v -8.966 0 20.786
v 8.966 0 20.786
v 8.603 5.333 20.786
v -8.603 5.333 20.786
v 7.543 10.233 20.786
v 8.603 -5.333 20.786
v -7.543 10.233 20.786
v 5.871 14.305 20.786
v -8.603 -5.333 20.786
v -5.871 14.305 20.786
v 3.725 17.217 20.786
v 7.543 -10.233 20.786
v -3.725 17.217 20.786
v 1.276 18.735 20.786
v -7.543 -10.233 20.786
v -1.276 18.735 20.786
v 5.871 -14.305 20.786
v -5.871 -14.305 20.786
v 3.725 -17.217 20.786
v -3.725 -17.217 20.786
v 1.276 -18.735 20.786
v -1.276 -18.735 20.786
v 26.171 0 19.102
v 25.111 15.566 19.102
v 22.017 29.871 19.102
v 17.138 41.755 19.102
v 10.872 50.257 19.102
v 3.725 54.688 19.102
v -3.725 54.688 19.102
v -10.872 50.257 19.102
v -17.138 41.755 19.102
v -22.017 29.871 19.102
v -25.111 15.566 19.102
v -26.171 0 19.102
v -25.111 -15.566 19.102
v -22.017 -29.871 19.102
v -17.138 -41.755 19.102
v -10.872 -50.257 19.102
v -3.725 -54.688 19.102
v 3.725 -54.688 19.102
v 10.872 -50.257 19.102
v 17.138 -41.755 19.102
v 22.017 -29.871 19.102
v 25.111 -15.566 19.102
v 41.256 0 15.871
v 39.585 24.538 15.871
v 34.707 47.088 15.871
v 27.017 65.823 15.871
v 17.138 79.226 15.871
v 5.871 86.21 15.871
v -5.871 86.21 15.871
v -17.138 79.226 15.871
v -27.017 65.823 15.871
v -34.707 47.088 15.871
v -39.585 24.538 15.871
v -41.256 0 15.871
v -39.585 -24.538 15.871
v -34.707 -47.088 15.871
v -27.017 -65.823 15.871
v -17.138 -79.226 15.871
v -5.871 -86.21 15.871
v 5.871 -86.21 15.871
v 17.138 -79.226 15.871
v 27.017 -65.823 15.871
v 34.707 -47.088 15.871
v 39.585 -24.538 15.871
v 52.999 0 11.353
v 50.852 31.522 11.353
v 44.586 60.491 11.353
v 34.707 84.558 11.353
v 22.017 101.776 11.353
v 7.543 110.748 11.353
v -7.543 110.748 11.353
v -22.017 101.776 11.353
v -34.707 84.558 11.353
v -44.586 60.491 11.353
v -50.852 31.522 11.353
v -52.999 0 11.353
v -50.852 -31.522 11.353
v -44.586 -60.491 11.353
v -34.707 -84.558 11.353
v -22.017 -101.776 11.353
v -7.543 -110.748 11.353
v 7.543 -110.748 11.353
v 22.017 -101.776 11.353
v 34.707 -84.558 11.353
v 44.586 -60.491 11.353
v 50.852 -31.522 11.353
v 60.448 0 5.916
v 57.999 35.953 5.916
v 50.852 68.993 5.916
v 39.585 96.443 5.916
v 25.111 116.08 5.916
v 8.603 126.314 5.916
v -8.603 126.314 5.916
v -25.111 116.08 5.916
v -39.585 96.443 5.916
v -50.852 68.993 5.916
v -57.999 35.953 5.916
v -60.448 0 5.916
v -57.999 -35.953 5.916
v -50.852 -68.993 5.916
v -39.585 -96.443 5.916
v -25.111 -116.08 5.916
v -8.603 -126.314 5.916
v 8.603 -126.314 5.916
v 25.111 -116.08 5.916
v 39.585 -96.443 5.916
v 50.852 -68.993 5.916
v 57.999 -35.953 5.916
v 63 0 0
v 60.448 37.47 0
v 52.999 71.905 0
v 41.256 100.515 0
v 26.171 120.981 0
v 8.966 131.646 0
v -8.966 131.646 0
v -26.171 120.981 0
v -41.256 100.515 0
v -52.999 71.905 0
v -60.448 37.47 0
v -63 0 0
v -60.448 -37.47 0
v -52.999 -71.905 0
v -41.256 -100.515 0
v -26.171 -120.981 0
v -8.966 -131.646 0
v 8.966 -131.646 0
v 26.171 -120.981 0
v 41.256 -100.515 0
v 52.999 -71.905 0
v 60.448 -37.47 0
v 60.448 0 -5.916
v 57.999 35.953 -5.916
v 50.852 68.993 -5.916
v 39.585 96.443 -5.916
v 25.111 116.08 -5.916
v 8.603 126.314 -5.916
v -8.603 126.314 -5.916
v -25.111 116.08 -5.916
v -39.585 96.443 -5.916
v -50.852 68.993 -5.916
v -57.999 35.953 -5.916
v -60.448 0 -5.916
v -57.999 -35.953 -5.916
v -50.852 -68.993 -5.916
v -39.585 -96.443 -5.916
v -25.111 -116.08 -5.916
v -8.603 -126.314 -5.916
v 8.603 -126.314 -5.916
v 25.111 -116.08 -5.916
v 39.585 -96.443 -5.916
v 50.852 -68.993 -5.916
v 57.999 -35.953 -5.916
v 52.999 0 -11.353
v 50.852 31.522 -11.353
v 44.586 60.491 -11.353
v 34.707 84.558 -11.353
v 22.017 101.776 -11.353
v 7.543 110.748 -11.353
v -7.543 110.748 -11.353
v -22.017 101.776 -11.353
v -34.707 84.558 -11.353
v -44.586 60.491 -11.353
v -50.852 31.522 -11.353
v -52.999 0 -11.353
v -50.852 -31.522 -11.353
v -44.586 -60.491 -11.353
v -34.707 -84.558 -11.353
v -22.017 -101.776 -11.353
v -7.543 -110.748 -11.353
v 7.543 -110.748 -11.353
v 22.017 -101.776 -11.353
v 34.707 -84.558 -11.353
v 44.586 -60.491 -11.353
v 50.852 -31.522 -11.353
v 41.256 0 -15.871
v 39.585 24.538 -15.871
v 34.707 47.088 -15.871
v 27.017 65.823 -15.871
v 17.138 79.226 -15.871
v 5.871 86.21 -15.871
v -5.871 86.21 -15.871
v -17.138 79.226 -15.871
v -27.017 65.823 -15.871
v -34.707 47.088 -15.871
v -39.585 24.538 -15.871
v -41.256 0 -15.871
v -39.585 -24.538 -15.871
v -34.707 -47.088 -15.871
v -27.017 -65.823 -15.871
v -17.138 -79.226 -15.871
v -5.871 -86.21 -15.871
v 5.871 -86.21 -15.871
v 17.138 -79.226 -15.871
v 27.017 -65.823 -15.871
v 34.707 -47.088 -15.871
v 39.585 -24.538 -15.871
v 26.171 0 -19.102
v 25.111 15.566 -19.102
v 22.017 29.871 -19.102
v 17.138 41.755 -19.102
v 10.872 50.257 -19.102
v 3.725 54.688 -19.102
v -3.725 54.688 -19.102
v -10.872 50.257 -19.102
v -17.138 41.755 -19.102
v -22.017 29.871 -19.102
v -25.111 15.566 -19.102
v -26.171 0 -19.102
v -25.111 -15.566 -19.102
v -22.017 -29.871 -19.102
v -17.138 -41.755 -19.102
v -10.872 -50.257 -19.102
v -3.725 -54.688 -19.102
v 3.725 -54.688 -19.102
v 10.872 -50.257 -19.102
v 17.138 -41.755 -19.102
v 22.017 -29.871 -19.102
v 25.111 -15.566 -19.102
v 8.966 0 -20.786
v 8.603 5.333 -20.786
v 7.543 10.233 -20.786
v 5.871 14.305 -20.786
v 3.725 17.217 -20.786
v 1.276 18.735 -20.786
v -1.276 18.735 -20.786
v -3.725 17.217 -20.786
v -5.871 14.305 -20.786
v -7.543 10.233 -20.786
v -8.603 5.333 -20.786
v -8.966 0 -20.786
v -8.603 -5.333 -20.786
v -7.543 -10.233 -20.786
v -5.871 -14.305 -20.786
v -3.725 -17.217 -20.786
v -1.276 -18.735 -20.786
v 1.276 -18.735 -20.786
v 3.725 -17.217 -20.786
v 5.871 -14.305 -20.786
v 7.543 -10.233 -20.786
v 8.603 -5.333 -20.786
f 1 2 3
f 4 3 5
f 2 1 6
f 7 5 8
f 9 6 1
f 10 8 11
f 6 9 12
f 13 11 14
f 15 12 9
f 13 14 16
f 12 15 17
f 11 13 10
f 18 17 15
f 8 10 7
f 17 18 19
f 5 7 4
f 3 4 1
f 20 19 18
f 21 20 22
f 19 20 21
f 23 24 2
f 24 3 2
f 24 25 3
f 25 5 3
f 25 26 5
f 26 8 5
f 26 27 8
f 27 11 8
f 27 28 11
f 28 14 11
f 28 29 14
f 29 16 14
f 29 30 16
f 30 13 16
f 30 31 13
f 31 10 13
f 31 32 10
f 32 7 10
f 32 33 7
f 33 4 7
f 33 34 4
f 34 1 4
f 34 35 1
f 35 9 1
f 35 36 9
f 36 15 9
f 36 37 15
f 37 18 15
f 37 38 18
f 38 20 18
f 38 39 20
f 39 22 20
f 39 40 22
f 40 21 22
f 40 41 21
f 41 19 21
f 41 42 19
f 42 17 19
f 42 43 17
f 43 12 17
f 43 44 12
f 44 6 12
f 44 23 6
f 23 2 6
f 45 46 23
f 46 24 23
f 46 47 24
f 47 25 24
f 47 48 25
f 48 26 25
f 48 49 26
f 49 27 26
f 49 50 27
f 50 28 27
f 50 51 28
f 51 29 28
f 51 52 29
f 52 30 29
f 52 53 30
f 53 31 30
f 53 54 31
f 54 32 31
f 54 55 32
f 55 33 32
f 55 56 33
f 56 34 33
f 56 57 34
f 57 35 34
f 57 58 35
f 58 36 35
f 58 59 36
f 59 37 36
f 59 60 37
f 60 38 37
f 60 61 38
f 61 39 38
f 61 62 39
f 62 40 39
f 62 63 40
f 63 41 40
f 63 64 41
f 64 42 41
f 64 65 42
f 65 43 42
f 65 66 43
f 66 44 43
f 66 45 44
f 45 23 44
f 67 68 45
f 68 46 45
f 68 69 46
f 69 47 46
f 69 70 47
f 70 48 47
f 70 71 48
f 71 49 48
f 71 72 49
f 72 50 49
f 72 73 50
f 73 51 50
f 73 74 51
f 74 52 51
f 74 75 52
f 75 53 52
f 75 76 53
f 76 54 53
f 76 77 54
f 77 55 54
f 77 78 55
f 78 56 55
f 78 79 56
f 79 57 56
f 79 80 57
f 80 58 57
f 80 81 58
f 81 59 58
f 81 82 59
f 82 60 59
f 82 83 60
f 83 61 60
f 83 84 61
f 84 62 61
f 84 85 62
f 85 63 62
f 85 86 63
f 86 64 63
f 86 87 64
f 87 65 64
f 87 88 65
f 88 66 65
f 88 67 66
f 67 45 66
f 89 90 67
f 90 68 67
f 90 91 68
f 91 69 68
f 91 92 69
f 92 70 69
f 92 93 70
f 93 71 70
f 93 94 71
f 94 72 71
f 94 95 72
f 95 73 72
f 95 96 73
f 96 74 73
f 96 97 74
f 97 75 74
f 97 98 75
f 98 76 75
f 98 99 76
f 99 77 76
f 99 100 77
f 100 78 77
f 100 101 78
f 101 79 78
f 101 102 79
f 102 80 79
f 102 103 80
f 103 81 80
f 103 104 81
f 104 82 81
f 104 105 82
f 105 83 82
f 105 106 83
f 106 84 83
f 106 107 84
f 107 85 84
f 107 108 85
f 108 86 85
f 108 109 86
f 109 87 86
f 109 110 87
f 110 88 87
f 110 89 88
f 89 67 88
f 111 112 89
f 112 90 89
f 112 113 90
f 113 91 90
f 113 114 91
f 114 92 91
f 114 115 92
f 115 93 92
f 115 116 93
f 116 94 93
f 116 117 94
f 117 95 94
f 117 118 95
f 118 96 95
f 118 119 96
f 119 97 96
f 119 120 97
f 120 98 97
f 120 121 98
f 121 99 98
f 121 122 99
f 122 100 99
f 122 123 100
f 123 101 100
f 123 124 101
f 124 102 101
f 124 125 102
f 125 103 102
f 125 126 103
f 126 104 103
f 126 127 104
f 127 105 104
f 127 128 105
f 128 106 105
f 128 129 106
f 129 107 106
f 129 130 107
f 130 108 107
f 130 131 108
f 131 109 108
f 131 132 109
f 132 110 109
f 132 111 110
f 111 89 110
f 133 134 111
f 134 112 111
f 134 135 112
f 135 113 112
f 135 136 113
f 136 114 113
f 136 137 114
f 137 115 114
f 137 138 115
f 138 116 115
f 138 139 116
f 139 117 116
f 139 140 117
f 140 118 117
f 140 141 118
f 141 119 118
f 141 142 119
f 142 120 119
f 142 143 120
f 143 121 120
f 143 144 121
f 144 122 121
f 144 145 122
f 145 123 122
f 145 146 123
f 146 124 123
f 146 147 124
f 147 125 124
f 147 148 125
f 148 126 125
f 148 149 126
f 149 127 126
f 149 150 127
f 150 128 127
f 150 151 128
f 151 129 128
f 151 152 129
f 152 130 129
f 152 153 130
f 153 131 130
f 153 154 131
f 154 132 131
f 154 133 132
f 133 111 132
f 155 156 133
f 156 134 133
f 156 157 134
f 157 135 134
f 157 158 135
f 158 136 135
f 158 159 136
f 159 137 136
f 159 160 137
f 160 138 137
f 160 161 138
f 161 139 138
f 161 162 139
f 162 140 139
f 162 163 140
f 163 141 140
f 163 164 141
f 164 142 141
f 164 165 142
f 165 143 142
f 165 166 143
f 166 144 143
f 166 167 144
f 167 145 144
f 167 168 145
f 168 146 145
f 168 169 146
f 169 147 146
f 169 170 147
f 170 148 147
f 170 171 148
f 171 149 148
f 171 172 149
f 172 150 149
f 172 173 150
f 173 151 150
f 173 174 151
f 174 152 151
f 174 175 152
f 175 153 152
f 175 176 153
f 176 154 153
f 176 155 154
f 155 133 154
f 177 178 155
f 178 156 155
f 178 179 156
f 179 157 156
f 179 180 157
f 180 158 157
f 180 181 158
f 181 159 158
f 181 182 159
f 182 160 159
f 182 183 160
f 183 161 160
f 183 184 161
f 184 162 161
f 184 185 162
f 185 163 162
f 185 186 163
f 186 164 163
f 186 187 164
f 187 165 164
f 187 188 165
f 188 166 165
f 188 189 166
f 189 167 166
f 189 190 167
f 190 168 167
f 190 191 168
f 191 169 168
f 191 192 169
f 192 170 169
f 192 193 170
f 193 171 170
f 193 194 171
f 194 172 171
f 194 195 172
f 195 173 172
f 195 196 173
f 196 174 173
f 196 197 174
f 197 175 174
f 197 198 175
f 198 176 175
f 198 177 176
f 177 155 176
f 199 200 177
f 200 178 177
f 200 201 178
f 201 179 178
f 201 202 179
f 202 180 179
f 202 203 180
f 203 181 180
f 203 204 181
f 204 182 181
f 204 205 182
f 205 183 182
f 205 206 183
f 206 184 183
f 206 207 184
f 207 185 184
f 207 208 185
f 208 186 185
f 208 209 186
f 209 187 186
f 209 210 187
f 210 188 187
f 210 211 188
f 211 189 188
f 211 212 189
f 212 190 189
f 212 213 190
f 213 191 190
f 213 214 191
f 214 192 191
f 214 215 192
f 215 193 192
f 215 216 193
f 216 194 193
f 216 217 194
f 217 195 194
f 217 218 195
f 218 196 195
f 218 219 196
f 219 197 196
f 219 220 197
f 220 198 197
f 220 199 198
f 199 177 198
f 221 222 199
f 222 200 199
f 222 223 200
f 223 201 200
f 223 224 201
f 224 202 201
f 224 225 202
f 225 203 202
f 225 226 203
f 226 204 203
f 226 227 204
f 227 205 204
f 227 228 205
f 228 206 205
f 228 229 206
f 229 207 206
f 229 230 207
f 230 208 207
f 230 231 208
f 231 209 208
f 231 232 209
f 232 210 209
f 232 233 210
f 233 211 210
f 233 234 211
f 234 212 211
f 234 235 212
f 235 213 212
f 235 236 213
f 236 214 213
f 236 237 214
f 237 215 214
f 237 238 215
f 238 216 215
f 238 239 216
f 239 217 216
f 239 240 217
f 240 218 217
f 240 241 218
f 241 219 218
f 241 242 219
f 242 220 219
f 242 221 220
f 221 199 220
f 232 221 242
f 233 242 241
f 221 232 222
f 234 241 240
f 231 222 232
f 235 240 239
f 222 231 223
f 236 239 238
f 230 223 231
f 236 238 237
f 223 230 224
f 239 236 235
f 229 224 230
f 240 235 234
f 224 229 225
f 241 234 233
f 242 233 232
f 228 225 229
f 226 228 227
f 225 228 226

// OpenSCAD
// Generated by SolidPython 1.0.1 on 2020-07-29 00:46:49


scale(v = [9, 19, 3]) {
	sphere(r = 7);
}
/***********************************************
*********      SolidPython code:      **********
************************************************
 
# import packages: SolidPython
from solid import *
from solid.utils import *
from itertools import chain, combinations, permutations


class Resize:

    def __init__(self, scad_file):
        self.scad_file = scad_file
        #self.scad_file = import_scad(scad_file)
        # cone/cylinder param:
        self.r1 = 0
        self.r2 = 0
        self.h = 0
        # rectangular prism param:
        self.w = 0
        self.l = 0
        # ellipse param:
        self.r = 0

    # import OpenScad code (file name corresponds to shape)


    # classify shape + parameters
    def assign(self, param1, param2, param3):
        if self.scad_file == 'cone.scad':
            self.r1 = param1
            self.r2 = param2
            self.h = param3
        elif self.scad_file == 'cylinder.scad':
            self.r1 = param1
            self.r2 = param2
            self.h = param3
        elif self.scad_file == 'rectangularPrism.scad':
            self.h = param1
            self.l = param2
            self.w = param3
        else:
            self.r = param1
            self.h = param2

    # resize parameters
    def iterate(self):
        x = range(3, 20, 2)
        i = 1
        if self.scad_file == 'cone.scad':
            tempList = list(permutations(x, 2))
            for temp in tempList:
                param1 = temp[0]
                param2 = temp[1]
                filepath = 'produced_scad_files/' + 'cone' + str(param1) + '_' + str(param2) + '_' + '.scad'
                scad_render_to_file(cylinder(h=param1, r1=param2, r2=0), filepath)

        elif self.scad_file == 'cylinder.scad':
            tempList = list(permutations(x, 3))
            for temp in tempList:
                param1 = temp[0]
                param2 = temp[1]
                filepath = 'produced_scad_files/' + 'cylinder' + str(param1) + '_' + str(param2) + '_' + '.scad'
                scad_render_to_file(cylinder(h=param1, r1=param2, r2=param2), filepath)

        elif self.scad_file == 'rectangularPrism.scad':
            tempList = list(permutations(x, 3))
            for temp in tempList:
                param1 = temp[0]
                param2 = temp[1]
                param3 = temp[2]
                filepath = 'produced_scad_files/' + 'rectangularPrism' + str(param1) + '_' + str(param2) + '_' + str(
                    param3) + '.scad'
                scad_render_to_file(cube(size=(param1, param2, param3)), filepath)

        elif self.scad_file == 'ellipse.scad':
            tempList = list(permutations(x, 4))
            for temp in tempList:
                param1 = temp[0]
                param2 = temp[1]
                param3 = temp[2]
                param4 = temp[3]
                filepath = 'produced_scad_files/' + 'ellipse' + str(param1) + '_' + str(param2) + '_' + str(param3) + '_' + str(param4) + '.scad'
                scad_render_to_file(scale([param1, param2, param3])(sphere(r=param4)), filepath)

    def render_to_scadfile(self):
        scad_render_to_file(scad, 'example.scad') 
 
************************************************/
